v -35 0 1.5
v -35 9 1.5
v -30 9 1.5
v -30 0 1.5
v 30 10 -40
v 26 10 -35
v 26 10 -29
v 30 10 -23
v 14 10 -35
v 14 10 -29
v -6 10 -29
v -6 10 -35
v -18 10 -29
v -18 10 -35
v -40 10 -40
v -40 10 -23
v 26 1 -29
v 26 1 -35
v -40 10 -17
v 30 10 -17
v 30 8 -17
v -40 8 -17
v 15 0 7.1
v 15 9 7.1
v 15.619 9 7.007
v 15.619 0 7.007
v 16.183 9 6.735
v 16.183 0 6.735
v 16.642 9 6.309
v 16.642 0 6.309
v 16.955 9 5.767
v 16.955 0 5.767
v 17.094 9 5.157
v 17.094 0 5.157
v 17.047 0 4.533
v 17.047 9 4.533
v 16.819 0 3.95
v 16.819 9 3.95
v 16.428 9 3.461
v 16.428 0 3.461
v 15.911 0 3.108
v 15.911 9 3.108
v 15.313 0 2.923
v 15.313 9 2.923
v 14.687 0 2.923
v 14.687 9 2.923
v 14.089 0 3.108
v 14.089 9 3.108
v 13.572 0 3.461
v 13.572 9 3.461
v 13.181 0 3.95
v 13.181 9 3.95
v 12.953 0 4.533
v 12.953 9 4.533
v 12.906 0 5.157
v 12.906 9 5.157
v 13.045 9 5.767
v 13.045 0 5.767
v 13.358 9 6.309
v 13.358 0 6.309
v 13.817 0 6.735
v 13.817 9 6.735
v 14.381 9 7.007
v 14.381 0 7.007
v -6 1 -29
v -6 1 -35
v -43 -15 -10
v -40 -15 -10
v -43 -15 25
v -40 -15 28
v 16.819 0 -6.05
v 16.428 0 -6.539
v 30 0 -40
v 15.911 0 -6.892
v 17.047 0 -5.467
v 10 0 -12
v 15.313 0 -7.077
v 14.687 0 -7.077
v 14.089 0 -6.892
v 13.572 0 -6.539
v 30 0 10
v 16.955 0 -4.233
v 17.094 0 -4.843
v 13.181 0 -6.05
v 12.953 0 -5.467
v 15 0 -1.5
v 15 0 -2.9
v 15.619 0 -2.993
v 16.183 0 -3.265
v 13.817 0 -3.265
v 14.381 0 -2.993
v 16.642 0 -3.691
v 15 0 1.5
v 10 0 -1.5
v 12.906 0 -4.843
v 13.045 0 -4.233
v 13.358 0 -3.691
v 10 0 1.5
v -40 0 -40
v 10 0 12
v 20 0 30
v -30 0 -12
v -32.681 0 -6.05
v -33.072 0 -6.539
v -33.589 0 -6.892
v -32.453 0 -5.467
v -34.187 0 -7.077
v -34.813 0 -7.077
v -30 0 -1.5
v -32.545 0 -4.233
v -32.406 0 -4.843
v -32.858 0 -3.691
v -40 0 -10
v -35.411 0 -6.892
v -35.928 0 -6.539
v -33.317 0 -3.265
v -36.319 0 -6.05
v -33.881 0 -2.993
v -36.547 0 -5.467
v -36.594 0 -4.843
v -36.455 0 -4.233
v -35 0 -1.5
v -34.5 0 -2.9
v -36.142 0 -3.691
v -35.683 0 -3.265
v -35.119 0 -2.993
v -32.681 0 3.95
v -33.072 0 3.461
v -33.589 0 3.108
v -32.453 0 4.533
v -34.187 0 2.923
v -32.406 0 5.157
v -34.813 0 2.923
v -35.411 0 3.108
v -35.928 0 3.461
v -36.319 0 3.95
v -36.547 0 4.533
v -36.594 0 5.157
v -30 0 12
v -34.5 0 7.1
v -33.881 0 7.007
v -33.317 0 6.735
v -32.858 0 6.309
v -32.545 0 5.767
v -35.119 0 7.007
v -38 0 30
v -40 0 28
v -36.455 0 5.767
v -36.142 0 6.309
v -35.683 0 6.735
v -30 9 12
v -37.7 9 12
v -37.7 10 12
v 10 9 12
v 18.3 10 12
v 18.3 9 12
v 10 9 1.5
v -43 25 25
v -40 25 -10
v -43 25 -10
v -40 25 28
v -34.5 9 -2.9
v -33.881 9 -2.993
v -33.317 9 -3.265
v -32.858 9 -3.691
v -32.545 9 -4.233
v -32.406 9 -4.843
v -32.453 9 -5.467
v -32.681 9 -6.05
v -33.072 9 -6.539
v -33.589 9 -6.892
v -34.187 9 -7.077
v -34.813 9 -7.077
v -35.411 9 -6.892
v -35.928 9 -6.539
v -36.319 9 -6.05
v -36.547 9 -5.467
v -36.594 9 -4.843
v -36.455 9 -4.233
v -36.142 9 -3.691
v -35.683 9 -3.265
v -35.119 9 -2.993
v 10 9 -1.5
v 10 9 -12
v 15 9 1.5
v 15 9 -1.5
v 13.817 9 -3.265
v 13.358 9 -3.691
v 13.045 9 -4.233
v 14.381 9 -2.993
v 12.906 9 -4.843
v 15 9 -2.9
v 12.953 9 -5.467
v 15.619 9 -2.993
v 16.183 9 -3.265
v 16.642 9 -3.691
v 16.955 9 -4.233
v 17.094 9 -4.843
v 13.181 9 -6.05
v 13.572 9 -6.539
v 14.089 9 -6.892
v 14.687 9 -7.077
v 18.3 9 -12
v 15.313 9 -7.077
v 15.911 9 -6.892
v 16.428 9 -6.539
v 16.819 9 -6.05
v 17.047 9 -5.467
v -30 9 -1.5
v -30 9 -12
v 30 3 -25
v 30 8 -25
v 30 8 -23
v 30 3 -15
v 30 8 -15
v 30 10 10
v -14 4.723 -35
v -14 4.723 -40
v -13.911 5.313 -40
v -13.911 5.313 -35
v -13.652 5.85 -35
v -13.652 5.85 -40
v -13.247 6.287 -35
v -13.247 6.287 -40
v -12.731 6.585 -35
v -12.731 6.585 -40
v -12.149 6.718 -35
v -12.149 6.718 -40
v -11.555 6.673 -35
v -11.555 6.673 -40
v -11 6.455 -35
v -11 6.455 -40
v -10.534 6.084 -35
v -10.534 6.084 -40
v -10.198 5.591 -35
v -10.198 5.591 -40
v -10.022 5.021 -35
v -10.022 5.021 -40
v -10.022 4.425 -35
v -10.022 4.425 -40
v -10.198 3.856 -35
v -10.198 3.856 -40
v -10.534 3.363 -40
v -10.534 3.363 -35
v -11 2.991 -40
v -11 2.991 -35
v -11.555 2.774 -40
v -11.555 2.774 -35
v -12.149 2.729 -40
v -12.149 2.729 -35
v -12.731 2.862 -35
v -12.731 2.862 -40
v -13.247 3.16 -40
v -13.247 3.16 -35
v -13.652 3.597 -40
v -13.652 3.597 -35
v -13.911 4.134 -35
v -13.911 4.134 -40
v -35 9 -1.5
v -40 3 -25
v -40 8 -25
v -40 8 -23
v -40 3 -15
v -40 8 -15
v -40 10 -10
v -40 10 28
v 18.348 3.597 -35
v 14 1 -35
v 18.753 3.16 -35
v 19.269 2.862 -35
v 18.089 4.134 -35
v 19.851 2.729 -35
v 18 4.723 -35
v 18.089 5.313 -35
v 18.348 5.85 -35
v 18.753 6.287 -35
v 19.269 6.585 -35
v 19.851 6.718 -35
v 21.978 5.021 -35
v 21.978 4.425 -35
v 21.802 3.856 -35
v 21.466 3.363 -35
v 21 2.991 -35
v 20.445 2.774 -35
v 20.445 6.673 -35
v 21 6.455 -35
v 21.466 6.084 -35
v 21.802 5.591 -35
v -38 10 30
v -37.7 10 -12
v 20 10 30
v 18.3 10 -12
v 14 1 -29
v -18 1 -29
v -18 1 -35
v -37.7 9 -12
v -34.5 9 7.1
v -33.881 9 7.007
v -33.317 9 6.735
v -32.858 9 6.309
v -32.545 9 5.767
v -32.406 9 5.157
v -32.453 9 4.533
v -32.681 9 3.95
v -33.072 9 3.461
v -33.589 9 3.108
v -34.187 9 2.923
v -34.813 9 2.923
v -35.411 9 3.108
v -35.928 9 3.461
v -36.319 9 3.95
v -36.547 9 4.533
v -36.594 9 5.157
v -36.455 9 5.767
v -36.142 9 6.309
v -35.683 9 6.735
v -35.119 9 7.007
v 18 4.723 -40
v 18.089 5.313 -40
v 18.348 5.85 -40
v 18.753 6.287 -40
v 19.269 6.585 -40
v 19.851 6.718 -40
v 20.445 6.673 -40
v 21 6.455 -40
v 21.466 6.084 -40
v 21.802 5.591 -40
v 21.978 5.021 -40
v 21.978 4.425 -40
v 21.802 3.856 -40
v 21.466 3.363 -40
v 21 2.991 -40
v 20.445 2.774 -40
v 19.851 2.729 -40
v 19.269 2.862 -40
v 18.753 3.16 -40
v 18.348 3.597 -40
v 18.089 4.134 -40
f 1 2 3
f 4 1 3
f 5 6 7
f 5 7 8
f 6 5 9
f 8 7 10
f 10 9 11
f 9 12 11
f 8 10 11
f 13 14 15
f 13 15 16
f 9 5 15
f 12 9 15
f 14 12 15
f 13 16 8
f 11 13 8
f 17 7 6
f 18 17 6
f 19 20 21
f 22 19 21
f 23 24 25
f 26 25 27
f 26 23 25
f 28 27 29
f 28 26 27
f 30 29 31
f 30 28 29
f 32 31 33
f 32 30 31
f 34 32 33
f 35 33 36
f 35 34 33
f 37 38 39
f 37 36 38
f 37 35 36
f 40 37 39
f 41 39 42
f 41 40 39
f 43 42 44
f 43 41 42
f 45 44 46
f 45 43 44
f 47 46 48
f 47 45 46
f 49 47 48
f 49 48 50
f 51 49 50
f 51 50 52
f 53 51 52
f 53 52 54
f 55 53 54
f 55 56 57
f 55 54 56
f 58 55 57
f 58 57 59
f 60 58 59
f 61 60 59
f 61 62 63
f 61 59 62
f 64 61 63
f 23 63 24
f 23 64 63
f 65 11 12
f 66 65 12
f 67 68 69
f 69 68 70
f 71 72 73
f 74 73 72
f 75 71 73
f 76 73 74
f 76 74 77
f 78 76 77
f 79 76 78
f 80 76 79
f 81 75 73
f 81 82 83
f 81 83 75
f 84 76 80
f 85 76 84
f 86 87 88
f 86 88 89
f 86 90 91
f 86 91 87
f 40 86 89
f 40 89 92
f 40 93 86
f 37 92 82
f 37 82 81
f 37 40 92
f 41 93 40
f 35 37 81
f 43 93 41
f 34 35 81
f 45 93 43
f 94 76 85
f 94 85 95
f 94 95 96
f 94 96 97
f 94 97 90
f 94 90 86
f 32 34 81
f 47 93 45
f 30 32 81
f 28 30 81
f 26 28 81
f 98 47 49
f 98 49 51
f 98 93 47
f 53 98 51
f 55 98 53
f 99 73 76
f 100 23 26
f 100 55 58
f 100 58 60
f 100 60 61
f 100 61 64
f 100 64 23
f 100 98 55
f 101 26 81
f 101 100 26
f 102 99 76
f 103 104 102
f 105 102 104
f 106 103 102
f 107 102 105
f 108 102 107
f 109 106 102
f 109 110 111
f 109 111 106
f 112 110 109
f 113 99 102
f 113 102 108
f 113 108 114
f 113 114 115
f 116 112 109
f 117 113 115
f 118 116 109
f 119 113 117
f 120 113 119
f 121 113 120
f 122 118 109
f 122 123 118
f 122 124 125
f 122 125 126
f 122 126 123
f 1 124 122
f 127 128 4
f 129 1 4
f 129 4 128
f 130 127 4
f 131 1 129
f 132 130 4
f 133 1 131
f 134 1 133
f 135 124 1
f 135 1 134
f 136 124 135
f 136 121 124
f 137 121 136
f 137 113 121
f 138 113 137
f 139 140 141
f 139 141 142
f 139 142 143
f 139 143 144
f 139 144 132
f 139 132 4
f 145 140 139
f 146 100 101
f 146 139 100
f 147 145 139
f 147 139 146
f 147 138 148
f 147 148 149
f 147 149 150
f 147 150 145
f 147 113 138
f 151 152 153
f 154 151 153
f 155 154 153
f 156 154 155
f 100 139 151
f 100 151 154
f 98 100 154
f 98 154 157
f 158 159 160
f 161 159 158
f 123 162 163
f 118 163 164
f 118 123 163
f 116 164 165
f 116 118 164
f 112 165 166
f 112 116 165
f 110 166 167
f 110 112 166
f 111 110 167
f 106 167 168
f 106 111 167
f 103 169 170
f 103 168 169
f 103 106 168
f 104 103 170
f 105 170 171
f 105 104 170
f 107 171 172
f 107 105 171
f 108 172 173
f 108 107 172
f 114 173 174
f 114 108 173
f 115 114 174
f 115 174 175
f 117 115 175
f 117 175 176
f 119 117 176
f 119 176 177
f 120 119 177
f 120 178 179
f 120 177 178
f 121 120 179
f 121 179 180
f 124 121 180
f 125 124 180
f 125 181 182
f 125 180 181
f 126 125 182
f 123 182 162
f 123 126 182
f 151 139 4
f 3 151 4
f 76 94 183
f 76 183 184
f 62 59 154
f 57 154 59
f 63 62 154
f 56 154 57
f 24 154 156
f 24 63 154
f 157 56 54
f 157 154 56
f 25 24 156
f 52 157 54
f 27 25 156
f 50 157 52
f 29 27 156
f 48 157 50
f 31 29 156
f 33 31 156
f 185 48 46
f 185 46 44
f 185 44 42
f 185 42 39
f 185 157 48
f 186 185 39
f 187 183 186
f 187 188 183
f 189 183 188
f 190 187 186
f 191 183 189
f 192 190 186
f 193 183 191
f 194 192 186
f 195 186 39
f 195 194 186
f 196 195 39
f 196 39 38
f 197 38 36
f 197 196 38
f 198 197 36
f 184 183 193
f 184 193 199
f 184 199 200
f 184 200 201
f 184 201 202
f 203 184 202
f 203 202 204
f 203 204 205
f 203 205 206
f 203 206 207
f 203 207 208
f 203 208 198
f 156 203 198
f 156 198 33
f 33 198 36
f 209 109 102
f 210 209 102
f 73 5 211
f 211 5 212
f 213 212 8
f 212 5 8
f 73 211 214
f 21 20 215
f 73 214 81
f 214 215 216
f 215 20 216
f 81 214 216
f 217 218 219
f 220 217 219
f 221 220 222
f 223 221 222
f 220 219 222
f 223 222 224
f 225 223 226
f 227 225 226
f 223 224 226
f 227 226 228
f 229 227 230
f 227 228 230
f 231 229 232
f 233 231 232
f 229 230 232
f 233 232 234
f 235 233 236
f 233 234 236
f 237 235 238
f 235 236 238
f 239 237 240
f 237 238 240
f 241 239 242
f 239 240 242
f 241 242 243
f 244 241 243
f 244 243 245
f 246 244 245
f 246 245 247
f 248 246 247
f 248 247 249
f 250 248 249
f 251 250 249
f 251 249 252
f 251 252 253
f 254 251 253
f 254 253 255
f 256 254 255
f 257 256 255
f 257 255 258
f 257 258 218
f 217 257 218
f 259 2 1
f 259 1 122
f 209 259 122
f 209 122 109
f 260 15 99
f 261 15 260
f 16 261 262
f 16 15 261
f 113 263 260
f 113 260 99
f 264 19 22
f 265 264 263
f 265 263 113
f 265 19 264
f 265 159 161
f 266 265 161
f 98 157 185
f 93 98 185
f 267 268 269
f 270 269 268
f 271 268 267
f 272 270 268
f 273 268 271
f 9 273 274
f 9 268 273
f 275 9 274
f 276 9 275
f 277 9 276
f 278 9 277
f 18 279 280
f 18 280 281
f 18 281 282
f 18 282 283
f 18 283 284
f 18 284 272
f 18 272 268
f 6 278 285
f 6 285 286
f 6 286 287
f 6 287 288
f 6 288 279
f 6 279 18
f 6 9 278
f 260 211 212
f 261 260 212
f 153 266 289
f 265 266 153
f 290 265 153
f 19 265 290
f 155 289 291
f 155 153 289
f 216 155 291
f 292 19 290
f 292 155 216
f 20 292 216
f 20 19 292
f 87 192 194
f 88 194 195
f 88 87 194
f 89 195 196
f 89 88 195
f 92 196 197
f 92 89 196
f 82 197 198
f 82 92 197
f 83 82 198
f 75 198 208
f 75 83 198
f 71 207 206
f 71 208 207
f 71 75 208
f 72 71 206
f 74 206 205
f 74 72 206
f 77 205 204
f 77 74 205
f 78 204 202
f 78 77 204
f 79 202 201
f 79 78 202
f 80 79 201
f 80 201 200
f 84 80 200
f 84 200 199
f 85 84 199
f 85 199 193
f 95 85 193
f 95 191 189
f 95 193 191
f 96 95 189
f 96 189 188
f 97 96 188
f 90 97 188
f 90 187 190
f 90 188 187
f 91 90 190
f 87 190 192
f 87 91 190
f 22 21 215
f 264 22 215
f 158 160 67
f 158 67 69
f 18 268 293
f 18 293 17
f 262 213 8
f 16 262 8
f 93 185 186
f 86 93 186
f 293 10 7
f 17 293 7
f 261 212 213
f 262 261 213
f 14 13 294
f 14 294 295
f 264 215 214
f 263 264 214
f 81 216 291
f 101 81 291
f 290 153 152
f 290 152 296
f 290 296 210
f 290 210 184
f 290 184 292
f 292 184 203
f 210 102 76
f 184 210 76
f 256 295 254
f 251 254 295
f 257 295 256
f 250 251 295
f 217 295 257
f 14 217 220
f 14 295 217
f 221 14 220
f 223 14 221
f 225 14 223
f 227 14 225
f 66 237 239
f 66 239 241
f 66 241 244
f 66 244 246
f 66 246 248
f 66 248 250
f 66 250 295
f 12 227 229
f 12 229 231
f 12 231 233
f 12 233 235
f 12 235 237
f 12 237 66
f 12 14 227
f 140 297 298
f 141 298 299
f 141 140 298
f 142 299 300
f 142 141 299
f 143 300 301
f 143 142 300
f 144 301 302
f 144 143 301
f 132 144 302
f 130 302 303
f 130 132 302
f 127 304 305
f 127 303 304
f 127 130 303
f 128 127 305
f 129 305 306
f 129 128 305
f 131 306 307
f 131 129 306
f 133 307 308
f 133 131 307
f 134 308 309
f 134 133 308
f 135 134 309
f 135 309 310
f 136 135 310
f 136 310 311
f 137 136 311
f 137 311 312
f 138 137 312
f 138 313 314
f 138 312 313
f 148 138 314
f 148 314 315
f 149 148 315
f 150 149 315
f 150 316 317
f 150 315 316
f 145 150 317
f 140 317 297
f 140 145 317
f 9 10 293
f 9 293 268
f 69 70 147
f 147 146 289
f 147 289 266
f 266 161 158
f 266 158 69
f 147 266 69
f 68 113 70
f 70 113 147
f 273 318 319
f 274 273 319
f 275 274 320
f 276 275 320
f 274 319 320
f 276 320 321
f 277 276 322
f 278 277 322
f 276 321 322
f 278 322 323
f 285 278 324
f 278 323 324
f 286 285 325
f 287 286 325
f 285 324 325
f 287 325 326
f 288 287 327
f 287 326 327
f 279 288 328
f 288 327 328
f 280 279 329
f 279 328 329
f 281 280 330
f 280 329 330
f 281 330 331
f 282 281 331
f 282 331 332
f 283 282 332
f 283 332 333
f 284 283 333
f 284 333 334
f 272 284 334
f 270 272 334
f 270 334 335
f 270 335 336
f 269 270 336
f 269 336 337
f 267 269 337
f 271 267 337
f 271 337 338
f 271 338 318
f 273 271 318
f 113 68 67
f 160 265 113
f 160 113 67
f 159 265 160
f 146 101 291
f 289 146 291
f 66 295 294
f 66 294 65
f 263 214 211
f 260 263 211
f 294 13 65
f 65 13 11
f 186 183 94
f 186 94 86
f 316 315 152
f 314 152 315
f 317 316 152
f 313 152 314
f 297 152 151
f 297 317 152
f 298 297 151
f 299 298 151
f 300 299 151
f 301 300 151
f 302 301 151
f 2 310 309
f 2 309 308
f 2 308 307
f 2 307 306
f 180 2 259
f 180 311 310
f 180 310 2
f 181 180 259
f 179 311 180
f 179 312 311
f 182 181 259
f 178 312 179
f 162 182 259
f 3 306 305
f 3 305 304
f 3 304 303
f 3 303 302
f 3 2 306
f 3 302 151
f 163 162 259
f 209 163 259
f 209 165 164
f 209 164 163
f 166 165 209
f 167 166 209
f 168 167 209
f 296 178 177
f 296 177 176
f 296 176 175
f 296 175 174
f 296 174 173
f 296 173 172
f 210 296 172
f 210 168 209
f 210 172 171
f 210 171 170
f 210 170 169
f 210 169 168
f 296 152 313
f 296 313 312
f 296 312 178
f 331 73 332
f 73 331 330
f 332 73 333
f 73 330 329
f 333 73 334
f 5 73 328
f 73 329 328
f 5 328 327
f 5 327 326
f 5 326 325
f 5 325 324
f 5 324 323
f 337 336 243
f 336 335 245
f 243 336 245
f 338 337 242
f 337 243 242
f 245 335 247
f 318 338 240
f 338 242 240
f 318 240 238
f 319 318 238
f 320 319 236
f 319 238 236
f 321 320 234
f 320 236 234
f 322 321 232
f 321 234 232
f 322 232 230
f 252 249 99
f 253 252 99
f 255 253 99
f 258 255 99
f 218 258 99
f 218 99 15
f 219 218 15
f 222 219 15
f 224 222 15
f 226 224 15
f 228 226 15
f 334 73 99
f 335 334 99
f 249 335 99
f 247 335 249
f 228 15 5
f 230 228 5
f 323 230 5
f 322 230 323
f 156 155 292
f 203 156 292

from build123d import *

# Parameters (mm, degrees)
SKETCH_1_W           = 80
SKETCH_1_H           = 60
SKETCH_1_R           = 2.1
SKETCH_1_W_2         = 40
SKETCH_1_H_2         = 24
EXTRUDE_1_DEPTH      = 10
CUT_EXTRUDE_1_DEPTH  = 80
SKETCH_5_W           = 5
SKETCH_5_H           = 3
CUT_EXTRUDE_2_DEPTH  = 80
SKETCH_7_W           = 56
SKETCH_7_H           = 24
CUT_EXTRUDE_3_DEPTH  = 1
SKETCH_8_W           = 40
SKETCH_8_H           = 40
EXTRUDE_2_DEPTH      = 3
SKETCH_9_W           = 10
SKETCH_9_H           = 60
CUT_EXTRUDE_4_DEPTH  = 10
CUT_EXTRUDE_11_DEPTH = 28
CUT_EXTRUDE_12_DEPTH = 28
SKETCH_24_W          = 10
SKETCH_24_H          = 10
EXTRUDE_3_DEPTH      = 70
SKETCH_25_W          = 12
SKETCH_25_H          = 6
CUT_EXTRUDE_13_DEPTH = 9
SKETCH_26_R          = 2
CUT_EXTRUDE_14_DEPTH = 8
CUT_EXTRUDE_15_REACH = 65.828


with BuildPart() as part:
    # 草圖1 → 填料-伸長1 (new body)
    with BuildSketch(Plane(origin=(0, 0, 0), x_dir=(1, 0, 0), z_dir=(0, 1, 0))):
        Rectangle(SKETCH_1_W, SKETCH_1_H)
        with Locations(Location((-34.5, -5, 0), (0, 0, 270))):
            Circle(SKETCH_1_R, mode=Mode.SUBTRACT)
        with Locations(Location((-34.5, 5, 0), (0, 0, 270))):
            Circle(SKETCH_1_R, mode=Mode.SUBTRACT)
        with Locations(Location((15, -5, 0), (0, 0, 270))):
            Circle(SKETCH_1_R, mode=Mode.SUBTRACT)
        with Locations(Location((15, 5, 0), (0, 0, 270))):
            Circle(SKETCH_1_R, mode=Mode.SUBTRACT)
        with Locations((-10, 0)):
            Rectangle(SKETCH_1_W_2, SKETCH_1_H_2, mode=Mode.SUBTRACT)
    extrude(amount=EXTRUDE_1_DEPTH)

    # 草圖4 → 除料-伸長1 (cut)
    with BuildSketch(Plane(origin=(40, 0, 0), x_dir=(0, 0, -1), z_dir=(1, 0, 0))):
        Polygon((17, 10), (17, 8), (15, 8), (15, 3), (25, 3), (25, 8), (23, 8), (23, 10), align=None)
    extrude(amount=-CUT_EXTRUDE_1_DEPTH, mode=Mode.SUBTRACT)

    # 草圖5 → 除料-伸長2 (cut)
    with BuildSketch(Plane(origin=(0, 10, 0), x_dir=(1, 0, 0), z_dir=(0, 1, 0))):
        with Locations((12.5, 0)):
            Rectangle(SKETCH_5_W, SKETCH_5_H)
        with Locations((-32.5, 0)):
            Rectangle(SKETCH_5_W, SKETCH_5_H)
    extrude(amount=-CUT_EXTRUDE_2_DEPTH, mode=Mode.SUBTRACT)

    # 草圖7 → 除料-伸長3 (cut)
    with BuildSketch(Plane(origin=(0, 10, 0), x_dir=(1, 0, 0), z_dir=(0, 1, 0))):
        with Locations((-9.7, 0)):
            Rectangle(SKETCH_7_W, SKETCH_7_H)
    extrude(amount=-CUT_EXTRUDE_3_DEPTH, mode=Mode.SUBTRACT)

    # 草圖8 → 填料-伸長2 (add)
    with BuildSketch(Plane.ZY.offset(40)):
        with Locations((10, 5)):
            Rectangle(SKETCH_8_W, SKETCH_8_H)
    extrude(amount=EXTRUDE_2_DEPTH)

    # 草圖9 → 除料-伸長4 (cut)
    with BuildSketch(Plane(origin=(0, 10, 0), x_dir=(1, 0, 0), z_dir=(0, 1, 0))):
        with Locations((35, 0)):
            Rectangle(SKETCH_9_W, SKETCH_9_H)
    extrude(amount=-CUT_EXTRUDE_4_DEPTH, mode=Mode.SUBTRACT)

    # 草圖22 → 除料-伸長11 (cut)
    with BuildSketch(Plane(origin=(0, 10, 0), x_dir=(1, 0, 0), z_dir=(0, 1, 0))):
        Polygon((-43, -25), (-43, -30), (-38, -30), align=None)
    extrude(amount=-CUT_EXTRUDE_11_DEPTH, mode=Mode.SUBTRACT)

    # 草圖23 → 除料-伸長12 (cut)
    with BuildSketch(Plane(origin=(0, 25, 0), x_dir=(1, 0, 0), z_dir=(0, 1, 0))):
        Polygon((-43, -30), (-38, -30), (-43, -25), align=None)
    extrude(amount=-CUT_EXTRUDE_12_DEPTH, mode=Mode.SUBTRACT)

    # 草圖24 → 填料-伸長3 (add)
    with BuildSketch(Plane.ZY.offset(40)):
        with Locations((-35, 5)):
            Rectangle(SKETCH_24_W, SKETCH_24_H)
    extrude(amount=-EXTRUDE_3_DEPTH)

    # 草圖25 → 除料-伸長13 (cut)
    with BuildSketch(Plane(origin=(0, 10, 0), x_dir=(1, 0, 0), z_dir=(0, 1, 0))):
        with Locations((-12, 32)):
            Rectangle(SKETCH_25_W, SKETCH_25_H)
        with Locations((20, 32)):
            Rectangle(SKETCH_25_W, SKETCH_25_H)
    extrude(amount=-CUT_EXTRUDE_13_DEPTH, mode=Mode.SUBTRACT)

    # 草圖26 → 除料-伸長14 (cut)
    with BuildSketch(Plane(origin=(0, 0, -40), x_dir=(-1, 0, 0), z_dir=(0, 0, -1))):
        with Locations((-20, 4.723394197)):
            Circle(SKETCH_26_R)
        with Locations((12, 4.723394197)):
            Circle(SKETCH_26_R)
    extrude(amount=-CUT_EXTRUDE_14_DEPTH, mode=Mode.SUBTRACT)

    # 草圖27 → 除料-伸長15 (cut, up to next)
    with BuildSketch(Plane(origin=(0, 10, 0), x_dir=(1, 0, 0), z_dir=(0, 1, 0)), mode=Mode.PRIVATE) as cut_extrude_15_sk1:
        Polygon((30, -10), (20, -30), (30, -30), align=None)
    cut_extrude_15_tool1 = extrude(cut_extrude_15_sk1.sketch, amount=-CUT_EXTRUDE_15_REACH, mode=Mode.PRIVATE) & part.part
    add(cut_extrude_15_tool1.solids().sort_by_distance((26.666667, 10, 23.333333))[0], mode=Mode.SUBTRACT)


solid = part.part
